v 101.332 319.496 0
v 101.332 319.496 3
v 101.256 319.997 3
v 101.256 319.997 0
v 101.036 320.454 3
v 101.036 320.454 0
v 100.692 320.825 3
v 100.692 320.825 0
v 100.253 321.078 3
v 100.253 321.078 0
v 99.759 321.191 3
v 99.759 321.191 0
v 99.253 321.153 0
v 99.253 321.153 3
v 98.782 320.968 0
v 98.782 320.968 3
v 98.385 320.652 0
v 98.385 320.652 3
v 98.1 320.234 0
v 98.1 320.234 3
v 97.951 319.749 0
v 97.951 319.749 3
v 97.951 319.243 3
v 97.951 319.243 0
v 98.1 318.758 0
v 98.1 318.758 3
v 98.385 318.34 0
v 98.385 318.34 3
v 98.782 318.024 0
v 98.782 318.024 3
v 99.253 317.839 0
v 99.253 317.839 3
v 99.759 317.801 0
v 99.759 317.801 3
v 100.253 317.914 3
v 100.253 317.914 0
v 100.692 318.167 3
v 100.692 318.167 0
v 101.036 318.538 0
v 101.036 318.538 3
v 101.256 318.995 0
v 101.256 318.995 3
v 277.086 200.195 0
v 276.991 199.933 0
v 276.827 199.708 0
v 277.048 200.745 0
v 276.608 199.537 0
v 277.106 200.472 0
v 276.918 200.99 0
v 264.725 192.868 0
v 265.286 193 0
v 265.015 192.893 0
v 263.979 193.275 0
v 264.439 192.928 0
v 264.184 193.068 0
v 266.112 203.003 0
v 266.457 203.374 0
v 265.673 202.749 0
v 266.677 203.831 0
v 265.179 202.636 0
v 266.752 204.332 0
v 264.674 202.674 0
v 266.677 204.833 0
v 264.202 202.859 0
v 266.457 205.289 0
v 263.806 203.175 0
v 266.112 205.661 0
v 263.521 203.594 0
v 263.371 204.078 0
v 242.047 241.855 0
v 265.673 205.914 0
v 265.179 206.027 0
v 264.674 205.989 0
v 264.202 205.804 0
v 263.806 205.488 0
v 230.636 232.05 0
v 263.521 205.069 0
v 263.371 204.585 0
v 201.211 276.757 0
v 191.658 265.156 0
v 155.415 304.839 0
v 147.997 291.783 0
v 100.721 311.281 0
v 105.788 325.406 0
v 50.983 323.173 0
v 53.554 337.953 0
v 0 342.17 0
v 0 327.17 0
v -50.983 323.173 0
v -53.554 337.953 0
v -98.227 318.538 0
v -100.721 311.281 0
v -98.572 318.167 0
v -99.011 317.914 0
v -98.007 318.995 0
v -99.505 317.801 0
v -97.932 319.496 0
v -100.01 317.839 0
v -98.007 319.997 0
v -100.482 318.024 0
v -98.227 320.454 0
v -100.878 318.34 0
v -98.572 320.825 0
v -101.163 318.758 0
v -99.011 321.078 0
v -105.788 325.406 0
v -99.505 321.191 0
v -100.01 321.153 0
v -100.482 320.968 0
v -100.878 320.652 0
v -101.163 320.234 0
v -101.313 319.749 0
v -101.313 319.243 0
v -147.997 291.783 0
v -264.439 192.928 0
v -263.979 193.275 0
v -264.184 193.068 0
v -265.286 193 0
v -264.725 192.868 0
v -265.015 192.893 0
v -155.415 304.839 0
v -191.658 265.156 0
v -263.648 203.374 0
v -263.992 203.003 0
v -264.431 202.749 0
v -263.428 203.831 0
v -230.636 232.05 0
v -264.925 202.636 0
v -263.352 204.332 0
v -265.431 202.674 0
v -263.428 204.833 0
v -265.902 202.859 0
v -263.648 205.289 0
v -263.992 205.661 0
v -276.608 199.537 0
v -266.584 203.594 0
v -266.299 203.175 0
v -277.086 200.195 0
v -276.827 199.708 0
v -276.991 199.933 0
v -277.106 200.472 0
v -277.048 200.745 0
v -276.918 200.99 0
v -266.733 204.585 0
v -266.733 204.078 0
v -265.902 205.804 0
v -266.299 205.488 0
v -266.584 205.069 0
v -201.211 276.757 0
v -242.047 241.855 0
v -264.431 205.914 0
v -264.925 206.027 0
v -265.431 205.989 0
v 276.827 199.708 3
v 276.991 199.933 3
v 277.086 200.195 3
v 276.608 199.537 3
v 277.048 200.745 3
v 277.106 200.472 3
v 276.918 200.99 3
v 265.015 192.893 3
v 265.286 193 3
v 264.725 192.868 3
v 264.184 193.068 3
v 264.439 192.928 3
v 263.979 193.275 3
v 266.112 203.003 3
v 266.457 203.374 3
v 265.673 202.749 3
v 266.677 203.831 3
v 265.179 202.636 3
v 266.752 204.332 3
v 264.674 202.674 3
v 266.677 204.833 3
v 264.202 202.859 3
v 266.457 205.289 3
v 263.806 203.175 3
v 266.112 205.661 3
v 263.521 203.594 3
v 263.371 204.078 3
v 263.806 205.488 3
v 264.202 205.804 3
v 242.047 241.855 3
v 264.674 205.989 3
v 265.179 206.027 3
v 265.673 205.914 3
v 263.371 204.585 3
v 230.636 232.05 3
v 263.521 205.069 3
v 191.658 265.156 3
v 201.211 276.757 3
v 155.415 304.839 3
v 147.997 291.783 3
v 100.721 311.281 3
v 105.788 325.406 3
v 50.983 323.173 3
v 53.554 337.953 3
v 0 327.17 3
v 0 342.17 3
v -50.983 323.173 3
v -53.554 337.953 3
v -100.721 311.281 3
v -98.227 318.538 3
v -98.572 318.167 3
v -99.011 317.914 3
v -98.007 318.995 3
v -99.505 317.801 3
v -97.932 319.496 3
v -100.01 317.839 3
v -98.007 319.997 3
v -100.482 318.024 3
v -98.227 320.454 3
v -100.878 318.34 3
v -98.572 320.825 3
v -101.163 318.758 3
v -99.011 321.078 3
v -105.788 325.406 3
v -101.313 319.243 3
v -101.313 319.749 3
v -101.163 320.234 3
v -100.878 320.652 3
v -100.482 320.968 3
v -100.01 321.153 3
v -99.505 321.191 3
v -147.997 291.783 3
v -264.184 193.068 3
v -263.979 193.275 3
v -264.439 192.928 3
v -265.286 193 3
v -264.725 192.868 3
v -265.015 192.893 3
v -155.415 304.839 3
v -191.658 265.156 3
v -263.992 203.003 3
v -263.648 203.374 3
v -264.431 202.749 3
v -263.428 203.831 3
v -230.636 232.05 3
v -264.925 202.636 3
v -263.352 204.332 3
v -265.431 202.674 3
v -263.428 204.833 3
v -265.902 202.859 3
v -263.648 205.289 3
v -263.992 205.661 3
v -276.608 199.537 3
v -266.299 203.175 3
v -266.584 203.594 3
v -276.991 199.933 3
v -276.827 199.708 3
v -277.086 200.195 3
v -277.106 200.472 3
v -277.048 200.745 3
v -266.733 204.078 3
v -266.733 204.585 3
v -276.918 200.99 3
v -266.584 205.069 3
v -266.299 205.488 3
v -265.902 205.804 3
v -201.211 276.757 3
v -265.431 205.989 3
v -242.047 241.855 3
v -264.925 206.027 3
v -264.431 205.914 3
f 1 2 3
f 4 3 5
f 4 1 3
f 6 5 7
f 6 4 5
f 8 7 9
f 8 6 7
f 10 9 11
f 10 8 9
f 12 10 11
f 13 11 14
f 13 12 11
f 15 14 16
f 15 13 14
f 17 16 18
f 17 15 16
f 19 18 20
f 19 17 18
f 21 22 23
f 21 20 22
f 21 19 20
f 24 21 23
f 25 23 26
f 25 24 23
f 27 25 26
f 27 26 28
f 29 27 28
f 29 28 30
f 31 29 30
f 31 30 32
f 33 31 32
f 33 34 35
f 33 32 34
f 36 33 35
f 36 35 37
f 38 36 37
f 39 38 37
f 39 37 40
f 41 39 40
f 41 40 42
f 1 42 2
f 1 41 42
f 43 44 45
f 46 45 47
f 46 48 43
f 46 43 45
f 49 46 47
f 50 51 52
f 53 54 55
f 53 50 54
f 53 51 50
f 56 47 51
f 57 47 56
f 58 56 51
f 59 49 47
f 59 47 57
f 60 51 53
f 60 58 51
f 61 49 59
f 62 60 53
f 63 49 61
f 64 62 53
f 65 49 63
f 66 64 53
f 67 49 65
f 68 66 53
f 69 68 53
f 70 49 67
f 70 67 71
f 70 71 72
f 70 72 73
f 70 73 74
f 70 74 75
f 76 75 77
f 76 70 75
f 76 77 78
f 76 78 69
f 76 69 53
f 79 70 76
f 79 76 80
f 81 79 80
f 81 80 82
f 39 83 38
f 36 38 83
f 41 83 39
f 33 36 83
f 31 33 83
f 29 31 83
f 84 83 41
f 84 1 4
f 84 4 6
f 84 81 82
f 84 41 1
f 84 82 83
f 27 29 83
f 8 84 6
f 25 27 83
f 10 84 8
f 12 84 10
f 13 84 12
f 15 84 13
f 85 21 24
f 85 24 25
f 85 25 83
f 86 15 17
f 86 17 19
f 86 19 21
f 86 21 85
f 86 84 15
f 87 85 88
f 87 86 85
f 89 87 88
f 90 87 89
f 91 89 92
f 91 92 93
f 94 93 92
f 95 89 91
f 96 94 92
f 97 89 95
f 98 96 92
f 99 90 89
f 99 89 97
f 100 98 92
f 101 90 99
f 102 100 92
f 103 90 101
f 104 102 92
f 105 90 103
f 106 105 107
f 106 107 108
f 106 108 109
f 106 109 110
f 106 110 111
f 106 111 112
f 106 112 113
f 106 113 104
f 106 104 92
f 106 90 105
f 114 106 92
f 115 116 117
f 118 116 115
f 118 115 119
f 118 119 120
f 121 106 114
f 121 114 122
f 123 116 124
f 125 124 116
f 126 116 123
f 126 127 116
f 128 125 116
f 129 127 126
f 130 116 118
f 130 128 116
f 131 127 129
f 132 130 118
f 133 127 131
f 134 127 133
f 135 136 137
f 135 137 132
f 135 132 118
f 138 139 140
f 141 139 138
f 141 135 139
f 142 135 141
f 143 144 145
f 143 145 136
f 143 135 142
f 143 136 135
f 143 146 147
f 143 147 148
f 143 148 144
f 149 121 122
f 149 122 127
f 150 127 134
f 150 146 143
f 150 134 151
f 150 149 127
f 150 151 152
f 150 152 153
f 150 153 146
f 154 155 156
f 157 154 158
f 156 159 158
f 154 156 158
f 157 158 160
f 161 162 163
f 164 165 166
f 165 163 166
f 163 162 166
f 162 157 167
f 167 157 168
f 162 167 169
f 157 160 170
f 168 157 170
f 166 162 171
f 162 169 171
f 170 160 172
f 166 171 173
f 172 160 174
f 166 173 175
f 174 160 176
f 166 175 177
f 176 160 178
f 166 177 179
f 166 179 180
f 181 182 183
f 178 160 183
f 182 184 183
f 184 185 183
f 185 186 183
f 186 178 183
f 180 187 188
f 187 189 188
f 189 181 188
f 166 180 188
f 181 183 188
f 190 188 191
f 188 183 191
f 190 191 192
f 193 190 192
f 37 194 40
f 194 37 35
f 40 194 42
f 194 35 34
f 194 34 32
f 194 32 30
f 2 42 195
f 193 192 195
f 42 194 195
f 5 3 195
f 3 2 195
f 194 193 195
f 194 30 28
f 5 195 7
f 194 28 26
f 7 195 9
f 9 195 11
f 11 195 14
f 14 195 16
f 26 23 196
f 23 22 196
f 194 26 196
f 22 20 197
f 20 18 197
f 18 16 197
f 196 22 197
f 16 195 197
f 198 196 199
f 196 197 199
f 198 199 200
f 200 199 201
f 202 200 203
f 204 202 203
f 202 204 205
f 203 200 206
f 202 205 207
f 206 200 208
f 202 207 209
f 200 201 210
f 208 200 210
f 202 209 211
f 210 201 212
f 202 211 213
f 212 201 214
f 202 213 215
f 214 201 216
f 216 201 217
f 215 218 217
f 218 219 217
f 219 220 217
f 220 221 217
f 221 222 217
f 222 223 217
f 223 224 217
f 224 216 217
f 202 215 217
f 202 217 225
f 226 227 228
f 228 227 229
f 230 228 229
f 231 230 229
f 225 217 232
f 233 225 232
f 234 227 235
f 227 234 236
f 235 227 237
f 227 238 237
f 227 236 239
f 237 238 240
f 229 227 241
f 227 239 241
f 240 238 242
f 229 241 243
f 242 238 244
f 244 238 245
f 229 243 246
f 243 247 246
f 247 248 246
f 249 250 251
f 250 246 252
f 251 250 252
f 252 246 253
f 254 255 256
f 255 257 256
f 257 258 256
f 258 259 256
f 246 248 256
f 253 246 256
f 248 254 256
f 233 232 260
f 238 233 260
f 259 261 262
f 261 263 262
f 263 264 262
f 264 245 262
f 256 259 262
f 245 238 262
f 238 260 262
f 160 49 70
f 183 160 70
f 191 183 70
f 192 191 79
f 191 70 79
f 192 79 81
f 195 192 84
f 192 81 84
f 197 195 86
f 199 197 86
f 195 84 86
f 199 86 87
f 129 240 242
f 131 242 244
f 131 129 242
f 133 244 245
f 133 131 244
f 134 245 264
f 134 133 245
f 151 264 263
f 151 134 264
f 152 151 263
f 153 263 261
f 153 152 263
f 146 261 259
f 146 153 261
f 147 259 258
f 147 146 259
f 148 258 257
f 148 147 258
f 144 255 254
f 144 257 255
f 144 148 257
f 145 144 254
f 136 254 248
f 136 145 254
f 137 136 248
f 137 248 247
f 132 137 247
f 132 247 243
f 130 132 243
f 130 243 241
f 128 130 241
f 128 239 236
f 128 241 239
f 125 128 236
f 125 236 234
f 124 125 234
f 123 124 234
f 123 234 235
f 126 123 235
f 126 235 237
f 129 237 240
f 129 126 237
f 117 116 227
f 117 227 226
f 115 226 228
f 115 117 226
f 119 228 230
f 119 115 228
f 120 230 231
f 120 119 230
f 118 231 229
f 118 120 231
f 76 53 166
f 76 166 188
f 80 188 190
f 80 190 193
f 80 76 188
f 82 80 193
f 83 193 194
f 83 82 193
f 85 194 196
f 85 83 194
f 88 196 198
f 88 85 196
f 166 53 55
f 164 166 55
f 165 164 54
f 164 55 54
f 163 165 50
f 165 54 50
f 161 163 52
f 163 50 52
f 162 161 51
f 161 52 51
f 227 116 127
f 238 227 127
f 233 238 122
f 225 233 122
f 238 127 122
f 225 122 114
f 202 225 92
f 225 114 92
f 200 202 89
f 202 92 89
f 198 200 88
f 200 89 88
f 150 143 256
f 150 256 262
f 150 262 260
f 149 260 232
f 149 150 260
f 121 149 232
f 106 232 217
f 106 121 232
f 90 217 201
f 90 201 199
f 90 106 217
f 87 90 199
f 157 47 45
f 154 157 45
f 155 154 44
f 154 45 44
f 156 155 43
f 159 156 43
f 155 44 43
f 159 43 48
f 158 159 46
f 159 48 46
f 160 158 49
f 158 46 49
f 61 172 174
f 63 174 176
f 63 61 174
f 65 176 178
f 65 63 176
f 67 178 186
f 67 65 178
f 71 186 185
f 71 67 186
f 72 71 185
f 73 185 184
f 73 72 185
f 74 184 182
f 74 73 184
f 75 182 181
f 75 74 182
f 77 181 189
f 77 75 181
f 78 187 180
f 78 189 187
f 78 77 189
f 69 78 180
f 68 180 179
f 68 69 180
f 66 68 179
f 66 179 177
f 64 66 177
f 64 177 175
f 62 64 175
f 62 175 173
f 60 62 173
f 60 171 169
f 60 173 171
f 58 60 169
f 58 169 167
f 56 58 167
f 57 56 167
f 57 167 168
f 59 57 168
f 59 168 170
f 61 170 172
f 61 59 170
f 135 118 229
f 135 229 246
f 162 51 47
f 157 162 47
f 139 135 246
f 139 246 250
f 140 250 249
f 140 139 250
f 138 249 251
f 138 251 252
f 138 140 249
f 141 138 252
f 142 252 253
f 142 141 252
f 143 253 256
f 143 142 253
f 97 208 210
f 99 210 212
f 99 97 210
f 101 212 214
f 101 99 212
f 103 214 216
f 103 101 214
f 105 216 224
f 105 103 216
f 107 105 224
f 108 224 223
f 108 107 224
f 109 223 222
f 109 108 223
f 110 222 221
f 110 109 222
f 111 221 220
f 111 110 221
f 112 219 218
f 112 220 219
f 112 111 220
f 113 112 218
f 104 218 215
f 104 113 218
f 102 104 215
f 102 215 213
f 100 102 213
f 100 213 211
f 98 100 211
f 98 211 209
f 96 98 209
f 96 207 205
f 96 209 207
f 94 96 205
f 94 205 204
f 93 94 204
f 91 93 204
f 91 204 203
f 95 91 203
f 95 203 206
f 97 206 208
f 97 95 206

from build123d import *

# Parameters (mm, degrees)
PAD004_DEPTH         = 3
SKETCH053_R          = 1.7
POCKET024_DEPTH      = 0.001
POCKET024_DEPTH_BACK = 3.001


with BuildPart() as part:
    # Sketch052 → Pad004 (new body)
    with BuildSketch(Plane.XY):
        with BuildLine():
            ThreePointArc((276.917507, 200.990417), (155.4148, 304.8388), (0, 342.170212))
            Line((0, 327.170212), (0, 342.170212))
            ThreePointArc((263.979122, 193.275376), (147.9973, 291.782704), (0, 327.170212))
            ThreePointArc((263.979122, 193.275376), (264.57986, 192.887597), (265.285977, 193.000099))
            Line((265.285977, 193.000099), (276.60821, 199.536993))
            ThreePointArc((276.60821, 199.536993), (277.086308, 200.194873), (276.917507, 200.990417))
        make_face()
    pad004 = extrude(amount=PAD004_DEPTH)

    # Mirrored009: Pad004 across Sketch052 V_Axis
    add(pad004.mirror(Plane(origin=(0, 0, 0), x_dir=(0, 0, 1), z_dir=(1, 0, 0))))

    # Sketch053 → Pocket024 (cut, two sides)
    with BuildSketch(Plane.XY) as pocket024_sk:
        with Locations((99.631602, 319.496001)):
            Circle(SKETCH053_R)
        with Locations((265.05233, 204.331625)):
            Circle(SKETCH053_R)
        with Locations((-99.631602, 319.496001)):
            Circle(SKETCH053_R)
        with Locations((-265.05233, 204.331625)):
            Circle(SKETCH053_R)
    extrude(amount=-POCKET024_DEPTH, mode=Mode.SUBTRACT)
    extrude(pocket024_sk.sketch, amount=POCKET024_DEPTH_BACK, mode=Mode.SUBTRACT)


solid = part.part
